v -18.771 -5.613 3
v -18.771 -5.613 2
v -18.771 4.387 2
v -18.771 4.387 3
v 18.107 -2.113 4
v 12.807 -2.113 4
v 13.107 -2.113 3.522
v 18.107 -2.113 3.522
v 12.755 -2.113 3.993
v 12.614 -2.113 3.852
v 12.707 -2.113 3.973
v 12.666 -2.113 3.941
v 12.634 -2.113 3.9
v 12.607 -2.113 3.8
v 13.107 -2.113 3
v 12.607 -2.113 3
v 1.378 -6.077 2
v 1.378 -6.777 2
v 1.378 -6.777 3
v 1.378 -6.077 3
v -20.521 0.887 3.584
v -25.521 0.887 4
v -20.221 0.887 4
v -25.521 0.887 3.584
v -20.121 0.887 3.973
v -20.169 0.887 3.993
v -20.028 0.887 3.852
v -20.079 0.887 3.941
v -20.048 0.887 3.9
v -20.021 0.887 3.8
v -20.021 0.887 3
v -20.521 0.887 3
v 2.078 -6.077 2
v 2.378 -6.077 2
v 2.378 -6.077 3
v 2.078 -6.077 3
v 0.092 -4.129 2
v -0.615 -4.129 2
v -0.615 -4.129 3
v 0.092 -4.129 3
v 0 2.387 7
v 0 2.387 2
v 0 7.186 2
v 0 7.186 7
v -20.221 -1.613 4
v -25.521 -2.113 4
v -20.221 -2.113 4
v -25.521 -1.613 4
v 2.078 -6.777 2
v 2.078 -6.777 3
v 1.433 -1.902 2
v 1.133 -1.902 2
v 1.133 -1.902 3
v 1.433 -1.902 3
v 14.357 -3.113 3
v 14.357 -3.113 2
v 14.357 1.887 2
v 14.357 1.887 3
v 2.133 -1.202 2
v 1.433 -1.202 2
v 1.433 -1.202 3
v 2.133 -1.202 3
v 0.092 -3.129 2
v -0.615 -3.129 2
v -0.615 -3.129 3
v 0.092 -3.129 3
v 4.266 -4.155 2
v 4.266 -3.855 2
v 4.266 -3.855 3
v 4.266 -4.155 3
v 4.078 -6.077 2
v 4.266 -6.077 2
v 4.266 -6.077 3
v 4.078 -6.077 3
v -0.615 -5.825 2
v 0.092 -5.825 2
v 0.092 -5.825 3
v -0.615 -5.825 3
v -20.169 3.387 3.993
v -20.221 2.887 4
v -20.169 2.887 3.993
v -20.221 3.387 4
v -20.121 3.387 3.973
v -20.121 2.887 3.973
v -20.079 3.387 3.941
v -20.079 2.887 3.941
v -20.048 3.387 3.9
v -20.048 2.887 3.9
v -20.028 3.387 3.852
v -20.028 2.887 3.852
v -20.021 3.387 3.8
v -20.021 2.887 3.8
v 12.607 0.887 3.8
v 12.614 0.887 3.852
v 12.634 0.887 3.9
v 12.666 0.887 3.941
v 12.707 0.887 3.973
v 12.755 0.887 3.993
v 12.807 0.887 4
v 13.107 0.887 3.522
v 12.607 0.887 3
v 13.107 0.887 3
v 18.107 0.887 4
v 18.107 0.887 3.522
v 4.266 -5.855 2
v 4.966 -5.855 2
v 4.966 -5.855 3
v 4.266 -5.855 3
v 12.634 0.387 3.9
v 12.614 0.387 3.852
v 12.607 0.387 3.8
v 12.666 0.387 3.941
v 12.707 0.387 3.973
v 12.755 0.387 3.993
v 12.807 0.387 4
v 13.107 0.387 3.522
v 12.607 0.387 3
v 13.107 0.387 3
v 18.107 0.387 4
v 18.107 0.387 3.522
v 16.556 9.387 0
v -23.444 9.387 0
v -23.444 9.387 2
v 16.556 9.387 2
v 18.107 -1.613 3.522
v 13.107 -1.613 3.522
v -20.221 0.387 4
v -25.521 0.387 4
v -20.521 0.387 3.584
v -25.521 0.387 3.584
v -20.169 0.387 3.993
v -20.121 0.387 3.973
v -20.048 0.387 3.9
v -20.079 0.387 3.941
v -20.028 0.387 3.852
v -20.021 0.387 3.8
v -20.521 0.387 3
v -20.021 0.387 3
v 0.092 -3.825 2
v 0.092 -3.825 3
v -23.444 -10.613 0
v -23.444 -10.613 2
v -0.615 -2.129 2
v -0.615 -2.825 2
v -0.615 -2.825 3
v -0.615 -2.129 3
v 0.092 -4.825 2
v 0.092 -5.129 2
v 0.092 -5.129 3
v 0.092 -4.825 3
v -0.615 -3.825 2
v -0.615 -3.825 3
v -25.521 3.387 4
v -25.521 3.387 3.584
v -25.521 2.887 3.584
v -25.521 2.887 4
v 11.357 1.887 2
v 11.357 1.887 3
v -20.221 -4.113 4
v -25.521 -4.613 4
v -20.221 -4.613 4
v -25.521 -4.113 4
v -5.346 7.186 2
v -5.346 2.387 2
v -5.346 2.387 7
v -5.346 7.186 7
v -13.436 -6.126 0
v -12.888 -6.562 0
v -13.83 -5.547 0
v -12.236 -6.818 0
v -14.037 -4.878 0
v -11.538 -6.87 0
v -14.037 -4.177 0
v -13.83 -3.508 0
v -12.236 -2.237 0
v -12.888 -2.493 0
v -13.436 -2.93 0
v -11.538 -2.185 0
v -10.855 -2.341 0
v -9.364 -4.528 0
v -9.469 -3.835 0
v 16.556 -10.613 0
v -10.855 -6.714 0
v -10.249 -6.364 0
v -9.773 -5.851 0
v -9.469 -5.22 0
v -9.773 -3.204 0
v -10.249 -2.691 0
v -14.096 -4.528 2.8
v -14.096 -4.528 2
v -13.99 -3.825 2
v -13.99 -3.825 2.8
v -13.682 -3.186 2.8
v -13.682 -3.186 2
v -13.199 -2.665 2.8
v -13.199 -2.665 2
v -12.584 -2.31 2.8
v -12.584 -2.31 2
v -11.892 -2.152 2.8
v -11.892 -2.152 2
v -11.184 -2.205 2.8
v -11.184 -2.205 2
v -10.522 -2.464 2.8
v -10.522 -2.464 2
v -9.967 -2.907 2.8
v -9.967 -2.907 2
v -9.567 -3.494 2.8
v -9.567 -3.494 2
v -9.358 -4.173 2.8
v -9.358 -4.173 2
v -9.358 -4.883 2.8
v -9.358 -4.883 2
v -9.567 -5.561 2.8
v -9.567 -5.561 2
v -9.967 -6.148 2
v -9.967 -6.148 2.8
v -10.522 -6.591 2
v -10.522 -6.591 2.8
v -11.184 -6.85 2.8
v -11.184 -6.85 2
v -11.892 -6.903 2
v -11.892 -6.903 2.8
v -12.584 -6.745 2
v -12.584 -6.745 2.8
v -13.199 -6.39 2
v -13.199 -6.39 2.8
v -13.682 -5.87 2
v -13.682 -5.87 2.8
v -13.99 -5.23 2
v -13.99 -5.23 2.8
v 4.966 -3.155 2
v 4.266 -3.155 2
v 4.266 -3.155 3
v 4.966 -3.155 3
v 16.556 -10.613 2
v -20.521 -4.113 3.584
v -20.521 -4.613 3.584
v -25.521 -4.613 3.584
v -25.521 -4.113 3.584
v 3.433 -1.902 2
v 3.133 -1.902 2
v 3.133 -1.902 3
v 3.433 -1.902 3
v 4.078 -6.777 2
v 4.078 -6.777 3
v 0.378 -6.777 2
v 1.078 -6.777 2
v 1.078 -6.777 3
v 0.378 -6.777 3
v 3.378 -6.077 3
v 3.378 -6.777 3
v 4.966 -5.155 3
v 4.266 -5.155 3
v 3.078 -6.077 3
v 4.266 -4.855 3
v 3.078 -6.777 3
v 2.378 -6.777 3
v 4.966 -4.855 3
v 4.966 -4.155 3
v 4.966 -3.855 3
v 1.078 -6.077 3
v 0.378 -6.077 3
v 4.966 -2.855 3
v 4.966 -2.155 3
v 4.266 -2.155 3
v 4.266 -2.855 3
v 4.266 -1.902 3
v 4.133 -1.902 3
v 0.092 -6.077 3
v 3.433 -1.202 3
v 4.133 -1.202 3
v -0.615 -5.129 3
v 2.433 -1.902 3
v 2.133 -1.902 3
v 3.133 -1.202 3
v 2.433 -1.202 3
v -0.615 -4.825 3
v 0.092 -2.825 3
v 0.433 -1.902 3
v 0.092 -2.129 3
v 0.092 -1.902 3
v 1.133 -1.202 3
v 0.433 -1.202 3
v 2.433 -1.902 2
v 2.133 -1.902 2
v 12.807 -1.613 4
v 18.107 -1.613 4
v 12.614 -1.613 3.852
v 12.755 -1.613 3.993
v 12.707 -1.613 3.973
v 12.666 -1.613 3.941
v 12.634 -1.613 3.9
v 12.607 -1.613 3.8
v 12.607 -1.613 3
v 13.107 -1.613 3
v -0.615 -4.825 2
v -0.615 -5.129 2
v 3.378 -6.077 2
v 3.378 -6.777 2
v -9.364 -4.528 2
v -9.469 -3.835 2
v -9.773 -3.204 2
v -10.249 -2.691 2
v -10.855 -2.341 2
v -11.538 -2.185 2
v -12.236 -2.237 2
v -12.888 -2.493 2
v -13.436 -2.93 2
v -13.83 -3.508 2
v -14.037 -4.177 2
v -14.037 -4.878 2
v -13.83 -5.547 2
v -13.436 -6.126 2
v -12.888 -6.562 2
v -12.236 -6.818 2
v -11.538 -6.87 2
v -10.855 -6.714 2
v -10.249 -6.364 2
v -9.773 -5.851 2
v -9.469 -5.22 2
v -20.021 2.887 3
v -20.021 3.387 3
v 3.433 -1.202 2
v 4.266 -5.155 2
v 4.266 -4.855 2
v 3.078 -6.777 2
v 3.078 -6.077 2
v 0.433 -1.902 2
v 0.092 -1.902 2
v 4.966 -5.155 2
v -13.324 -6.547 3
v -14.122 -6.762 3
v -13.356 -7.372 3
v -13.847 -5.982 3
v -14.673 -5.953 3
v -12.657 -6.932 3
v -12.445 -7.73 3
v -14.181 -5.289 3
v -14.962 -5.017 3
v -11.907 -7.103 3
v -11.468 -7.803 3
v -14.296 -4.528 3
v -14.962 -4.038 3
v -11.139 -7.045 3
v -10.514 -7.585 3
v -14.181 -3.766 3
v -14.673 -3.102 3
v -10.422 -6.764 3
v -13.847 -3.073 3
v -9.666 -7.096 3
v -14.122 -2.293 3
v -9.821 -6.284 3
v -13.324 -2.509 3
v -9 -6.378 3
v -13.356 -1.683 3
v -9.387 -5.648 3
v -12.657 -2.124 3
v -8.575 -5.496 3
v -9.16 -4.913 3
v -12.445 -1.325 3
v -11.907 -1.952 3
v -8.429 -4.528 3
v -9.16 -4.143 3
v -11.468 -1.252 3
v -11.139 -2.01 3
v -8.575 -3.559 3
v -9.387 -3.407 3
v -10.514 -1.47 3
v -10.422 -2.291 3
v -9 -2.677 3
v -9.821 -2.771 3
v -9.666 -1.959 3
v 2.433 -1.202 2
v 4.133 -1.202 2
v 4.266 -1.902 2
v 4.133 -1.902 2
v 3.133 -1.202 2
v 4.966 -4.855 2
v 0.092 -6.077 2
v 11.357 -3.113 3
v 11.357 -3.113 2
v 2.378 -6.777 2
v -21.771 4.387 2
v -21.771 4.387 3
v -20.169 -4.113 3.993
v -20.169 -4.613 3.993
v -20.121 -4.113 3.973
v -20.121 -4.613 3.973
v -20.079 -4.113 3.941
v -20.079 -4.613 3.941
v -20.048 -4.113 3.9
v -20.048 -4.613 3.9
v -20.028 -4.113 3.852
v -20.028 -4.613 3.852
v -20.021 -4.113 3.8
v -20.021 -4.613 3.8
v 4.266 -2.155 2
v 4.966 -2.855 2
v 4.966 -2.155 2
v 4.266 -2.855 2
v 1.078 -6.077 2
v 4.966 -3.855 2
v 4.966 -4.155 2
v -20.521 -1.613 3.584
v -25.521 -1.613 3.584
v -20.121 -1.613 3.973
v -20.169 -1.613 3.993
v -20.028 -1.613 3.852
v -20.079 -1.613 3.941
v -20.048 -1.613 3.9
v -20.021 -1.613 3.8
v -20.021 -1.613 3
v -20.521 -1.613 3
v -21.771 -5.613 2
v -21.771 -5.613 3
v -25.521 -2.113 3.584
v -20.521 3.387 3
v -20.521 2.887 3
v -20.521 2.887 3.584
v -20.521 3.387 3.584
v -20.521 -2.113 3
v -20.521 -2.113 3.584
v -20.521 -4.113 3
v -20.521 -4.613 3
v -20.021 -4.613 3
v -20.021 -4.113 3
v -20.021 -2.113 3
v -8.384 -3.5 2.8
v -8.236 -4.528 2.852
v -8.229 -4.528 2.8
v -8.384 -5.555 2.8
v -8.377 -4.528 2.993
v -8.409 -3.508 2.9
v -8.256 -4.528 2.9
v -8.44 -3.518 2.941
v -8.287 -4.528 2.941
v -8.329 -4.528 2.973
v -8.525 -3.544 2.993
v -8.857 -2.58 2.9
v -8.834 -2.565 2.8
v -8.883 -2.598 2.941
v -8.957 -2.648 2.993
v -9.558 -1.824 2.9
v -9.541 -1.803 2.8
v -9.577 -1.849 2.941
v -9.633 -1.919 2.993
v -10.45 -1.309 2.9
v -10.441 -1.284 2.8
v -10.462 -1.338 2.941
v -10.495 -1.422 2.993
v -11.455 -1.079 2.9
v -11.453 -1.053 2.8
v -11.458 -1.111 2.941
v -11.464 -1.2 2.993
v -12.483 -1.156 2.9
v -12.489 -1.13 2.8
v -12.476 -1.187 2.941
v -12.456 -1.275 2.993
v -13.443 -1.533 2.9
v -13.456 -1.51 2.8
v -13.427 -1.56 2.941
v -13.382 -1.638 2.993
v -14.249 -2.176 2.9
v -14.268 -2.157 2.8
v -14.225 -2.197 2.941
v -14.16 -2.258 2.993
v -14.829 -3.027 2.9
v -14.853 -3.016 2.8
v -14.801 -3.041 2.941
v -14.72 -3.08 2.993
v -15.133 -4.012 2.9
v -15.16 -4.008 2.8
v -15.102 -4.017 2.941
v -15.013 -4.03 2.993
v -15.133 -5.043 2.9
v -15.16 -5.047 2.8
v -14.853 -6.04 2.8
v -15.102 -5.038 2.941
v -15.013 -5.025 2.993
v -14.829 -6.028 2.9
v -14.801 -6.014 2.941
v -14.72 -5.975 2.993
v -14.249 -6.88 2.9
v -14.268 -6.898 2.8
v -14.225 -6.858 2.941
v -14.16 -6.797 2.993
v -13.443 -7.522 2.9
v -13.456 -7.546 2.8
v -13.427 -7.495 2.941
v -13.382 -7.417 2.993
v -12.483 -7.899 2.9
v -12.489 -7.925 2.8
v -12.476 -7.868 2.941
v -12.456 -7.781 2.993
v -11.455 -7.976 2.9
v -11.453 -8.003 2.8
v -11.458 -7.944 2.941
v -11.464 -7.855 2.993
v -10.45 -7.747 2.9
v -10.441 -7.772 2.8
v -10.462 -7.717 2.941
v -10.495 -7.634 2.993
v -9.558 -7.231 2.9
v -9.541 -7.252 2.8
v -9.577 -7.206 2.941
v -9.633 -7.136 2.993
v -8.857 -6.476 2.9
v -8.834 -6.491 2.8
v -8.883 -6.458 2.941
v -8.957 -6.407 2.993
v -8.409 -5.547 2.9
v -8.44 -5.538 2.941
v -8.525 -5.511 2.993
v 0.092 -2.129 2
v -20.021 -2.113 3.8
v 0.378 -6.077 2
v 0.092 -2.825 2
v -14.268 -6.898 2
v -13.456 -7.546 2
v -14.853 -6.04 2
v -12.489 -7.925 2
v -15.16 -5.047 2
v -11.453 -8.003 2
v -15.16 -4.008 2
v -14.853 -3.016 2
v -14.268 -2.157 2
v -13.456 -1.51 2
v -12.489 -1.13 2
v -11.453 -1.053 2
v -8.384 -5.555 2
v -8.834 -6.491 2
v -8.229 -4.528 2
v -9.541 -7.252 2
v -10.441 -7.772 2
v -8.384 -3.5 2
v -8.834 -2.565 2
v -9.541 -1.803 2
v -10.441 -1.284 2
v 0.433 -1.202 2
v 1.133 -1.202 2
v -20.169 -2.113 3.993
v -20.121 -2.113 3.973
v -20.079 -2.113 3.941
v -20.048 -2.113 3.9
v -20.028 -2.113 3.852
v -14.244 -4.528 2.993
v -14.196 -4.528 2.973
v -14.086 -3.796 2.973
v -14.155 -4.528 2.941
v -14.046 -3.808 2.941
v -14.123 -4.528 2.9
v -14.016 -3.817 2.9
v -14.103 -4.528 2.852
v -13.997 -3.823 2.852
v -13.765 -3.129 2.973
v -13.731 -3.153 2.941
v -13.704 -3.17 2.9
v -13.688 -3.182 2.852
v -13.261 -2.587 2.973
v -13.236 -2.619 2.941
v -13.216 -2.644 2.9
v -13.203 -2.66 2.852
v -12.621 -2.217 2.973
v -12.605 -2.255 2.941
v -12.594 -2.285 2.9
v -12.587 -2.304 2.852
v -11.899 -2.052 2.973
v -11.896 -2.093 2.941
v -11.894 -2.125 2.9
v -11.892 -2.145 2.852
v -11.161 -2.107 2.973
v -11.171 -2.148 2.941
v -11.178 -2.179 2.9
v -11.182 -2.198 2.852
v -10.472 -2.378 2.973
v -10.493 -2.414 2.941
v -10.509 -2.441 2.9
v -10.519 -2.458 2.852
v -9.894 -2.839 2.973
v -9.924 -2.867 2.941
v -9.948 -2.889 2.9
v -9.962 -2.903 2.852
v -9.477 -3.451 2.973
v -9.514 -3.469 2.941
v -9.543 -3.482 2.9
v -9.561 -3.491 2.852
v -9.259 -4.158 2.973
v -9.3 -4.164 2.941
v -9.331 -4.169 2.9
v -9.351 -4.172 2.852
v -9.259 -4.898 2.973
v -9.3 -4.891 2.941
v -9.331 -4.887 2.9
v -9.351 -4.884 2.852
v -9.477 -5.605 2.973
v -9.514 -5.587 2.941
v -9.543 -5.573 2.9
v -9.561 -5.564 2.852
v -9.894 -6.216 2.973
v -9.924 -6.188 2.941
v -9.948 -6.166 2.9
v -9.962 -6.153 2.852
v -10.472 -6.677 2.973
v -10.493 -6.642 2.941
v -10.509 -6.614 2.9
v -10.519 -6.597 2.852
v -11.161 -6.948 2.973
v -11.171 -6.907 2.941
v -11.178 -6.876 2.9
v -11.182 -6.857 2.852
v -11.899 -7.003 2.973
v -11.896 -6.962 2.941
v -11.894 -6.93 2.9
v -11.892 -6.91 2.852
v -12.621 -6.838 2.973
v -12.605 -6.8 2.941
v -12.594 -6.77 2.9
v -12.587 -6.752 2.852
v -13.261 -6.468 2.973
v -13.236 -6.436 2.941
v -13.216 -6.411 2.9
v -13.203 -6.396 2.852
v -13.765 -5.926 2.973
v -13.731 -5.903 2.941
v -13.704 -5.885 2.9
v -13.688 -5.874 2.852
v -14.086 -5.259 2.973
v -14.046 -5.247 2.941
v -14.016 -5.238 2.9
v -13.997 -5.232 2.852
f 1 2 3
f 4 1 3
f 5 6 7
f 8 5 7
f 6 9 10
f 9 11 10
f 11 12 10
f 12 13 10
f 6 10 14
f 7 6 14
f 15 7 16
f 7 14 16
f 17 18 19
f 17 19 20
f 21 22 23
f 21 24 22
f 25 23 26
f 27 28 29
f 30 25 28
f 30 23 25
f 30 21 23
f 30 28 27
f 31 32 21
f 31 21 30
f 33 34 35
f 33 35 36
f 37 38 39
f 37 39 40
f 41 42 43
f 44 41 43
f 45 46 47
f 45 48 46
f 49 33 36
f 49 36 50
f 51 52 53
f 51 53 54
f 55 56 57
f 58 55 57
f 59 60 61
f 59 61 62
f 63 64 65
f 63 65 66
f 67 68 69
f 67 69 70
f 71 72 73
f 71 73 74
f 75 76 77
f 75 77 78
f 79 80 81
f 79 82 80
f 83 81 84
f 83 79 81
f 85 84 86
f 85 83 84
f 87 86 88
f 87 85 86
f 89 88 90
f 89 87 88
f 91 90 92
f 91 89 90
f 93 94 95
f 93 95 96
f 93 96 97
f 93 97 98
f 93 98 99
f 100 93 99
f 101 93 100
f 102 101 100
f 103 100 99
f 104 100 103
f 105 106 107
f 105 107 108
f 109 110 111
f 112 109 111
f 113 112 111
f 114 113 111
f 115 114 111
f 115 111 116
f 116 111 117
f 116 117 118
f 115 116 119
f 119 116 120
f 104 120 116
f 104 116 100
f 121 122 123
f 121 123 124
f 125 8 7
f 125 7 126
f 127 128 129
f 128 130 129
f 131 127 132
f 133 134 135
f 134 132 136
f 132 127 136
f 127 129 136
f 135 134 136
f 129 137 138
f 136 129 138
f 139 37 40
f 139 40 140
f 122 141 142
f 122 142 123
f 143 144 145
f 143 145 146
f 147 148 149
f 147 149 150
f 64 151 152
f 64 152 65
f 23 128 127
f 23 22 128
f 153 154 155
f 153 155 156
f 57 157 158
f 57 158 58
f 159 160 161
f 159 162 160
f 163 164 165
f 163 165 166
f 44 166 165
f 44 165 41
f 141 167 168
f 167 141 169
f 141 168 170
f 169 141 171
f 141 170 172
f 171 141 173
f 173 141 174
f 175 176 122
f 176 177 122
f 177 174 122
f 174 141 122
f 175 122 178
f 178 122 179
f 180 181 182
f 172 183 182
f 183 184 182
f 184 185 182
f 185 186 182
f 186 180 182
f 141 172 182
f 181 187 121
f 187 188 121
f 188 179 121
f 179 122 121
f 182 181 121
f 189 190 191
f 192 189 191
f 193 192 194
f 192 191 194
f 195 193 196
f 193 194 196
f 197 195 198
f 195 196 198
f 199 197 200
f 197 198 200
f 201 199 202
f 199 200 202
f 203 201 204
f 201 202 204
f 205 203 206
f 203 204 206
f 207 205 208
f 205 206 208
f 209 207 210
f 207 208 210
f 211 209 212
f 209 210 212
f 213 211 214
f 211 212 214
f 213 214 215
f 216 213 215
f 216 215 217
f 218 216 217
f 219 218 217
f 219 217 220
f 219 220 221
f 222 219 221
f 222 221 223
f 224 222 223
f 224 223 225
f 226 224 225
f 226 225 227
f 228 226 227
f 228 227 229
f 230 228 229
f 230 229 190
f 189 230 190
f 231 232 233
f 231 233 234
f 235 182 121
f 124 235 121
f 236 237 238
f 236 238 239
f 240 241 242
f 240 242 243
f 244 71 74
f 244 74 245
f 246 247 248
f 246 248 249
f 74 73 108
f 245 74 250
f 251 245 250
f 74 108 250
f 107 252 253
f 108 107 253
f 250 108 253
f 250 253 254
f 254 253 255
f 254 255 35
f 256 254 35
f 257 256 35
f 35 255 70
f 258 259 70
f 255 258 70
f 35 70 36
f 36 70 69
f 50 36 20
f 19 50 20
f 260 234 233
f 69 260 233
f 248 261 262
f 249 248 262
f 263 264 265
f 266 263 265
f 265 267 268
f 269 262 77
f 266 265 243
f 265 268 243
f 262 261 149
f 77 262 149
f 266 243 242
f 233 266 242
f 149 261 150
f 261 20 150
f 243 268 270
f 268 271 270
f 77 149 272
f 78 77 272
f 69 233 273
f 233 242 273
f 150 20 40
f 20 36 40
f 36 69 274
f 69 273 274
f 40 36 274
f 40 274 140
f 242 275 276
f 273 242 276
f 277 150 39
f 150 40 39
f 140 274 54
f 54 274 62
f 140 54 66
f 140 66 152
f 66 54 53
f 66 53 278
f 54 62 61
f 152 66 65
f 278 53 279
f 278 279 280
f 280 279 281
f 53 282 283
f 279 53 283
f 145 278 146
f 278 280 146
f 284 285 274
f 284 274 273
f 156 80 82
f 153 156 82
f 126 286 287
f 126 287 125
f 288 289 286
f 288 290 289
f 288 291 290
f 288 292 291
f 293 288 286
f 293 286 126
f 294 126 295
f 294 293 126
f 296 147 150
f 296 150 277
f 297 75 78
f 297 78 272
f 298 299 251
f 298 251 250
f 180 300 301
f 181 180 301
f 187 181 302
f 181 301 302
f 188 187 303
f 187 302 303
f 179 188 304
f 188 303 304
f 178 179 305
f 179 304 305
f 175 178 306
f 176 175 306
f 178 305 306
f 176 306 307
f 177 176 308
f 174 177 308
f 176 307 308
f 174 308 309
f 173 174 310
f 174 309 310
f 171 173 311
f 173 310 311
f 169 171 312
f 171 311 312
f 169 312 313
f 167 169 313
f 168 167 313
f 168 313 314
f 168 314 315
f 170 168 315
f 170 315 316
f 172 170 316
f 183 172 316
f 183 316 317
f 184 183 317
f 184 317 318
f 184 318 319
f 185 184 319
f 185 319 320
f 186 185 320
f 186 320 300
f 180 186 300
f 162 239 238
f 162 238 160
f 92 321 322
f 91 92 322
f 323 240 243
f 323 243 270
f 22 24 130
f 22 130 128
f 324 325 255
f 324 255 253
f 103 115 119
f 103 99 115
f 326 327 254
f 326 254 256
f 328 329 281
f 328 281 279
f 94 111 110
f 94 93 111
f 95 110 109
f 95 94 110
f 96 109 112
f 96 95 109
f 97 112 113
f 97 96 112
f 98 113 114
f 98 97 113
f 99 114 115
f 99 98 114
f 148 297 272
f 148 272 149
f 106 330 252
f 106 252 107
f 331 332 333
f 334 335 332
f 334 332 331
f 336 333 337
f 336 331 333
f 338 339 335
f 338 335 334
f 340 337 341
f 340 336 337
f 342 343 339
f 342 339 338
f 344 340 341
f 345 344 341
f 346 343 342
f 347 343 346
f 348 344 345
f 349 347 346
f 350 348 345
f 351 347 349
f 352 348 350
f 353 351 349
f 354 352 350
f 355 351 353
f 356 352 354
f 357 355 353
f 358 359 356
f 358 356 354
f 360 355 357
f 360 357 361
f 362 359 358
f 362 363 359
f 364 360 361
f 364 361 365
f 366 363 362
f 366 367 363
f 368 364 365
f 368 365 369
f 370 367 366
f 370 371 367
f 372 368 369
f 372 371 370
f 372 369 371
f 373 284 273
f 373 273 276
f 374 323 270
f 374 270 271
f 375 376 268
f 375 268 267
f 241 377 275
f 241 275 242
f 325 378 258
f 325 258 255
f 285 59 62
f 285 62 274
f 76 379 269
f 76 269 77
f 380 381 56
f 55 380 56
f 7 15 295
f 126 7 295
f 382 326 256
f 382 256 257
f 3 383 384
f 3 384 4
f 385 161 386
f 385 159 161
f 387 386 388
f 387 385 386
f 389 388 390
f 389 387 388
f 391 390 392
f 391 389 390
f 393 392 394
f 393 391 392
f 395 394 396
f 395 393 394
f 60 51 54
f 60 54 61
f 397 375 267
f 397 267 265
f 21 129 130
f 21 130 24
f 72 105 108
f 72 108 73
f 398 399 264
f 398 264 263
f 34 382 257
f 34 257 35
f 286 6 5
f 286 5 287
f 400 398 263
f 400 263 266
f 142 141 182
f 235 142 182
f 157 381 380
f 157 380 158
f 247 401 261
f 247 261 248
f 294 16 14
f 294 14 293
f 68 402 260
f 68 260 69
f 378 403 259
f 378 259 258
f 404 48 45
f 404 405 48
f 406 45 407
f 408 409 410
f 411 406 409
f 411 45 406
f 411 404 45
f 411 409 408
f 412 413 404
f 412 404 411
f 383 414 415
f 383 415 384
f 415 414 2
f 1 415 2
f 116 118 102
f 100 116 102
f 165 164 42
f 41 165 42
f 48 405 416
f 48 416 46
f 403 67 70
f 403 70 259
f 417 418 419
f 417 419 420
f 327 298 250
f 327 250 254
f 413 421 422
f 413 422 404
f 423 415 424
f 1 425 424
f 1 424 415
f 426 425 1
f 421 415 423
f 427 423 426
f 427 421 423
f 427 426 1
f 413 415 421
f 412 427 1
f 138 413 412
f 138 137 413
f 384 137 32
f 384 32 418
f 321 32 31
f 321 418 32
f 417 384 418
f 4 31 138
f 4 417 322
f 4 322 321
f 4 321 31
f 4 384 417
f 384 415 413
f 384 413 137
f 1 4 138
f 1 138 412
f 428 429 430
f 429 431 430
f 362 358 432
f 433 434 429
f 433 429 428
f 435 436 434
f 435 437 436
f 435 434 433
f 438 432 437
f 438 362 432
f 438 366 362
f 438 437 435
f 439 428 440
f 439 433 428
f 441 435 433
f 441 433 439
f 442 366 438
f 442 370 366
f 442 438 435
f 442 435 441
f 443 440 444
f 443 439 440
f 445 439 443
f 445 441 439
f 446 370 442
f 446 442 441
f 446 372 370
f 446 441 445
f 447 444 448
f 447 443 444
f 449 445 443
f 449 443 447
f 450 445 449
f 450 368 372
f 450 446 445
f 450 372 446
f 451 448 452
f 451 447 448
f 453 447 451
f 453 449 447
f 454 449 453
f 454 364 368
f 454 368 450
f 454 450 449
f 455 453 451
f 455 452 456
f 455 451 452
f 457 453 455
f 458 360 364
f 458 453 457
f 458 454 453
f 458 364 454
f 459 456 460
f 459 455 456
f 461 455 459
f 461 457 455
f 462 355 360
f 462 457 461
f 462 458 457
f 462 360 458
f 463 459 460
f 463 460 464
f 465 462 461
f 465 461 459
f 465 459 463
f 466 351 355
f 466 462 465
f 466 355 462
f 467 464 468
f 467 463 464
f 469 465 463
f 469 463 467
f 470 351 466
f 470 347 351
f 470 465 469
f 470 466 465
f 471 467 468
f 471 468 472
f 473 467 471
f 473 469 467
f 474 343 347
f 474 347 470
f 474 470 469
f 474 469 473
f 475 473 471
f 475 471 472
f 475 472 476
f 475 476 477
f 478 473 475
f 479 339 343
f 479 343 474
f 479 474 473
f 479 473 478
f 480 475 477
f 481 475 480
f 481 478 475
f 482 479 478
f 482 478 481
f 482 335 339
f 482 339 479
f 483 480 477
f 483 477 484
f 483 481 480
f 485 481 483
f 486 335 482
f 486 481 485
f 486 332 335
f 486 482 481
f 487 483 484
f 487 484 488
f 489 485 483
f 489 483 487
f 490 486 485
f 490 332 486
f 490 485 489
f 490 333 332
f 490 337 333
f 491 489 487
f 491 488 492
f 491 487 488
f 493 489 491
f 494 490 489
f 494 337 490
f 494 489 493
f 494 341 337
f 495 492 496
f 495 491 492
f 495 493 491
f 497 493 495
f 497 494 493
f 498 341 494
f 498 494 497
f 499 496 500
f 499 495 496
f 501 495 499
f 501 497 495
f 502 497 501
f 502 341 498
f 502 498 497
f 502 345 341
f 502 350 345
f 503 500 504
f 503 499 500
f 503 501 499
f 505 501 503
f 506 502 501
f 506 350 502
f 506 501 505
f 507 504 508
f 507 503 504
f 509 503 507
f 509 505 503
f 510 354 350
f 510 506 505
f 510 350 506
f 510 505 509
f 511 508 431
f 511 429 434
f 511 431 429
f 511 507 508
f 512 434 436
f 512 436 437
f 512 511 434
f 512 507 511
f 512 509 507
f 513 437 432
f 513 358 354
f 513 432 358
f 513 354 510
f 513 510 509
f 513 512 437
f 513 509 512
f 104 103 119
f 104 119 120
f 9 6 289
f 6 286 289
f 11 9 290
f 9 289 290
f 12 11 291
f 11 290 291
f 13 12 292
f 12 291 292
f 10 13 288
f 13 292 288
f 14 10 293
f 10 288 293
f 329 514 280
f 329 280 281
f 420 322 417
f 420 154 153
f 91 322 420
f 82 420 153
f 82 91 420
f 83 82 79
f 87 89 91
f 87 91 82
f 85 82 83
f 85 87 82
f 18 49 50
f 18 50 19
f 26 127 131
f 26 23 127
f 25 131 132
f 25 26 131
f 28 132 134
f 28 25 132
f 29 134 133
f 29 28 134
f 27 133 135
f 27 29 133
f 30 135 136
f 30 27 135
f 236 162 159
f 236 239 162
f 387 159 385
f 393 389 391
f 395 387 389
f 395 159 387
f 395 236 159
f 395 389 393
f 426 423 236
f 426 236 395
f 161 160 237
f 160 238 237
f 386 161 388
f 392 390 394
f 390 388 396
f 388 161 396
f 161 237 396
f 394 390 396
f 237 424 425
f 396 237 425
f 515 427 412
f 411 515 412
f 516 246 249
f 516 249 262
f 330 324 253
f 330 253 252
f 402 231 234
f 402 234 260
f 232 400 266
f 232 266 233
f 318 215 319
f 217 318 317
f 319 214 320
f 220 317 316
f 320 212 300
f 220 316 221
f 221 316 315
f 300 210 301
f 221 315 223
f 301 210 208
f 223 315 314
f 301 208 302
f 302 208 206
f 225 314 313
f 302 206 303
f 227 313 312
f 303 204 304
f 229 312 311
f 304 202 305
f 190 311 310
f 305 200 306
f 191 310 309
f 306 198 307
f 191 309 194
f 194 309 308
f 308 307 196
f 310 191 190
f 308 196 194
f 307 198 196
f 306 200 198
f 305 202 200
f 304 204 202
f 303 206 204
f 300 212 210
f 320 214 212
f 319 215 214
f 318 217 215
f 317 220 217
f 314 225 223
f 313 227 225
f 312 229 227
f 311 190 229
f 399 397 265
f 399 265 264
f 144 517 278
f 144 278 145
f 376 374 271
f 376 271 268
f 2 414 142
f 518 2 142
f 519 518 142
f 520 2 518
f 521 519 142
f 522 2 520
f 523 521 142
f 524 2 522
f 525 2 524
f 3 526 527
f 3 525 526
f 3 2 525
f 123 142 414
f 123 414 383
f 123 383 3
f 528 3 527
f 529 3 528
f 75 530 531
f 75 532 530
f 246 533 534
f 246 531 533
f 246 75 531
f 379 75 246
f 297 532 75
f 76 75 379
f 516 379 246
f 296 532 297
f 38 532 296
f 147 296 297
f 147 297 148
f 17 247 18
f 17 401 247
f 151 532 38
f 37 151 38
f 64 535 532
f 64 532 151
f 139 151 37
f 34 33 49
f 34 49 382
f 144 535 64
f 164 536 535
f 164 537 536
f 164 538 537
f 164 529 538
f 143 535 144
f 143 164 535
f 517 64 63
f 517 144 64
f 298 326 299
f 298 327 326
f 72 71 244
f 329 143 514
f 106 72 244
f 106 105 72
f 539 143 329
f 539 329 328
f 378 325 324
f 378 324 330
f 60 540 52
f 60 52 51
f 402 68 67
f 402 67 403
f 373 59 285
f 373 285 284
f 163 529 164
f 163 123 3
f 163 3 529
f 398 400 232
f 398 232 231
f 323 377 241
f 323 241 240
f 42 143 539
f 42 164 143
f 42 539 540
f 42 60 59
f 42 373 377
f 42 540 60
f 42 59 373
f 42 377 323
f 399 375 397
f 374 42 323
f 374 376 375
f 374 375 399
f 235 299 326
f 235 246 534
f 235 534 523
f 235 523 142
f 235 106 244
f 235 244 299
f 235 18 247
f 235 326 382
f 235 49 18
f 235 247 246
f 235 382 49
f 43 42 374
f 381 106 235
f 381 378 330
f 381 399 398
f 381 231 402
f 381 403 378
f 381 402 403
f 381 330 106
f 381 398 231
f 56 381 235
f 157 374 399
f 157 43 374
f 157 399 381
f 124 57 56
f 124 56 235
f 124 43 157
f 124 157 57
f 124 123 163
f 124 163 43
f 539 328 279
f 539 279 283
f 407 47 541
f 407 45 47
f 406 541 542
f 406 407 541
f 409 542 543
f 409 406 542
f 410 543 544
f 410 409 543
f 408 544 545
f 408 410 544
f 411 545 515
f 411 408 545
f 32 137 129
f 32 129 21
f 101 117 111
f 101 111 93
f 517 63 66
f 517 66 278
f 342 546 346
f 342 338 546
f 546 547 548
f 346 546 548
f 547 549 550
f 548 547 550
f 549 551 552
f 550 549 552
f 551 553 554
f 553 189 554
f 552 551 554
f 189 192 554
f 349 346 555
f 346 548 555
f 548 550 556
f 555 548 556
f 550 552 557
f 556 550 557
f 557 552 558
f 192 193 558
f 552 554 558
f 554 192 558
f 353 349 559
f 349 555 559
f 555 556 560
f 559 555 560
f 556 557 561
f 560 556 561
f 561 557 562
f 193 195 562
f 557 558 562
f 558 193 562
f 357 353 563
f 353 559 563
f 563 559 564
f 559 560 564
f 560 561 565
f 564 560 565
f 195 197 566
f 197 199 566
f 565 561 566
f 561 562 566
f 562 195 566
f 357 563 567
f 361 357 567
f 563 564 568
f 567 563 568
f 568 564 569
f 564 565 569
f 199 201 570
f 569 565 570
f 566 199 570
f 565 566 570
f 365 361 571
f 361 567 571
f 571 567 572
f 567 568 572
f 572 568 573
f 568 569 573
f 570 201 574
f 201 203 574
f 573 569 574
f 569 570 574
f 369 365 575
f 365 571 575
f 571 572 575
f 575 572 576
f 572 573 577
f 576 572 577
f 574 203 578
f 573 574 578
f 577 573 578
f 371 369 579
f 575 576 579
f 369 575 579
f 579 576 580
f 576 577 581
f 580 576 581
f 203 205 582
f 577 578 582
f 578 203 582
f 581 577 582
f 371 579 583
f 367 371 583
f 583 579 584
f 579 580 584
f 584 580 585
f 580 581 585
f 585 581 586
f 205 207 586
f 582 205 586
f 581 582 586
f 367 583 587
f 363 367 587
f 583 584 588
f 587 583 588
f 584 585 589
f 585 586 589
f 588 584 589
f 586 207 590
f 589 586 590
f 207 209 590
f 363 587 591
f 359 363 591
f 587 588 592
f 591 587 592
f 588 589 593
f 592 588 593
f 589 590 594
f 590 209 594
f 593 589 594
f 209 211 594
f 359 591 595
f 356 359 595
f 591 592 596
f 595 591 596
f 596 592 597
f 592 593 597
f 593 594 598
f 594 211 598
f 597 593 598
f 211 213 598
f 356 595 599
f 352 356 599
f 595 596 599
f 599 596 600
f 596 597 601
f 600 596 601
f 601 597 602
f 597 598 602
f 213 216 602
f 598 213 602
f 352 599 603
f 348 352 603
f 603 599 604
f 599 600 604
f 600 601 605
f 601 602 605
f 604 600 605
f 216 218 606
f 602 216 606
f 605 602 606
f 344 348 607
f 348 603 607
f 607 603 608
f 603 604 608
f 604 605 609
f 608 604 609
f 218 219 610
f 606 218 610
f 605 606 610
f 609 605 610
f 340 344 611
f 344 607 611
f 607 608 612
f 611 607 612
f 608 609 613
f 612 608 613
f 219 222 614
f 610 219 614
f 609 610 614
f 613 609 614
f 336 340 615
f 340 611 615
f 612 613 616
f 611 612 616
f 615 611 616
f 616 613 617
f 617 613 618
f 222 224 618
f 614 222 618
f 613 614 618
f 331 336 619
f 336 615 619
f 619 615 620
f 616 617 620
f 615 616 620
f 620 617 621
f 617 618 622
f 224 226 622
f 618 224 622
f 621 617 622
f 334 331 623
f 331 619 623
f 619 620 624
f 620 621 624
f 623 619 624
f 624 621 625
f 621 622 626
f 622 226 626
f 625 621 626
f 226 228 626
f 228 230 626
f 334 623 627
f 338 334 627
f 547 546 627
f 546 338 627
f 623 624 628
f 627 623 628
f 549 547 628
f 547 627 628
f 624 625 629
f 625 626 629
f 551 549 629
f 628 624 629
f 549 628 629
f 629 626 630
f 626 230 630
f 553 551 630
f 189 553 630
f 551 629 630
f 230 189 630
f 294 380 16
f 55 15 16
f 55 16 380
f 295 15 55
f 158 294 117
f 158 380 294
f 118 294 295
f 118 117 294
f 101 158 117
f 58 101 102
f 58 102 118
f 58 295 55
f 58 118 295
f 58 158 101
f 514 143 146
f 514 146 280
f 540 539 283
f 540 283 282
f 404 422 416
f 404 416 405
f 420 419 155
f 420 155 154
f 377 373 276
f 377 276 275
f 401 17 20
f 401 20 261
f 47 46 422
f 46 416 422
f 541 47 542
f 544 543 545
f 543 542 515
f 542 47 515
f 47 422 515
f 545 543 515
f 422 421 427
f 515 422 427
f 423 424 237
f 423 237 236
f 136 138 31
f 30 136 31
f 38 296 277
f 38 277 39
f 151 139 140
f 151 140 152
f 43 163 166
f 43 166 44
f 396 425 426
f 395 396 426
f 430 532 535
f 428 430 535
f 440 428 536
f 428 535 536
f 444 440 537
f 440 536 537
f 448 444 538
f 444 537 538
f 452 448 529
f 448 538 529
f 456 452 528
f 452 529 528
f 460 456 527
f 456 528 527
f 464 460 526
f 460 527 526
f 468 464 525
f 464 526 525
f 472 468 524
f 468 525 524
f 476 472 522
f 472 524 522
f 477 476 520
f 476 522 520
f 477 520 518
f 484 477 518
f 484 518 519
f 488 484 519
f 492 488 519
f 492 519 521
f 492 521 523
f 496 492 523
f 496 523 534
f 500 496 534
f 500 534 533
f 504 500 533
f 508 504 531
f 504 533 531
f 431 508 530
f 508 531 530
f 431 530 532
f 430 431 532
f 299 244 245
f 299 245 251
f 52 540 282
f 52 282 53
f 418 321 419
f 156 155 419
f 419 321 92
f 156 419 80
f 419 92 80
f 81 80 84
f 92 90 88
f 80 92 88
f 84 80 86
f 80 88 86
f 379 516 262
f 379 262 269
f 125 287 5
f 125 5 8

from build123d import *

# Parameters (mm, degrees)
SKETCH1_W           = 40
SKETCH1_H           = 20
BOSS_EXTRUDE1_DEPTH = 2
SKETCH2_W           = 3
SKETCH2_H           = 10
SKETCH2_H_2         = 5
BOSS_EXTRUDE2_DEPTH = 1
SKETCH3_W           = 0.5
SKETCH3_H           = 0.5
BOSS_EXTRUDE3_DEPTH = 1
SKETCH5_W           = 0.415981526
SKETCH5_H           = 0.5
BOSS_EXTRUDE4_DEPTH = 5
FILLET1_R           = 0.2
SKETCH7_W           = 0.477868842
SKETCH7_H           = 0.5
BOSS_EXTRUDE5_DEPTH = 5
FILLET3_R           = 0.2
SKETCH8_W           = 5.346247603
SKETCH8_H           = 4.799297503
BOSS_EXTRUDE6_DEPTH = 5
BOSS_EXTRUDE8_DEPTH = 1
CUT_EXTRUDE1_REACH  = 30.088
SKETCH10_R          = 2.349261849
SKETCH13_R          = 3.48485592
BOSS_EXTRUDE9_DEPTH = 1
CUT_EXTRUDE2_REACH  = 30.088
SKETCH14_R          = 2.382418239
FILLET5_R           = 0.2


with BuildPart() as part:
    # Sketch1 → Boss-Extrude1 (new body)
    with BuildSketch(Plane.XY):
        with Locations((-3.443579767, -0.612840467)):
            Rectangle(SKETCH1_W, SKETCH1_H)
    extrude(amount=BOSS_EXTRUDE1_DEPTH)

    # Sketch2 → Boss-Extrude2 (add)
    with BuildSketch(Plane.XY.offset(2)):
        with Locations((-20.270719319, -0.612840467)):
            Rectangle(SKETCH2_W, SKETCH2_H)
        with Locations((12.857244344, -0.612840467)):
            Rectangle(SKETCH2_W, SKETCH2_H_2)
    extrude(amount=BOSS_EXTRUDE2_DEPTH)

    # Sketch3 → Boss-Extrude3 (add)
    with BuildSketch(Plane.XY.offset(3)):
        with Locations((-20.270719319, 3.137159533)):
            Rectangle(SKETCH3_W, SKETCH3_H)
        with Locations((-20.270719319, 0.637159533)):
            Rectangle(SKETCH3_W, SKETCH3_H)
        with Locations((-20.270719319, -1.862840467)):
            Rectangle(SKETCH3_W, SKETCH3_H)
        with Locations((-20.270719319, -4.362840467)):
            Rectangle(SKETCH3_W, SKETCH3_H)
        with Locations((12.857244344, -1.862840467)):
            Rectangle(SKETCH3_W, SKETCH3_H)
        with Locations((12.857244344, 0.637159533)):
            Rectangle(SKETCH3_W, SKETCH3_H)
    extrude(amount=BOSS_EXTRUDE3_DEPTH)

    # Sketch5 → Boss-Extrude4 (add)
    with BuildSketch(Plane.ZY.offset(20.520719319)):
        with Locations((3.792009237, 3.137159533)):
            Rectangle(SKETCH5_W, SKETCH5_H)
        with Locations((3.792009237, 0.637159533)):
            Rectangle(SKETCH5_W, SKETCH5_H)
        with Locations((3.792009237, -1.862840467)):
            Rectangle(SKETCH5_W, SKETCH5_H)
        with Locations((3.792009237, -4.362840467)):
            Rectangle(SKETCH5_W, SKETCH5_H)
    extrude(amount=BOSS_EXTRUDE4_DEPTH)

    # Fillet1
    fillet1_edges = [part.edges().sort_by_distance(p)[0] for p in [
        (-20.020719319, 3.137159533, 4),
        (-20.020719319, 0.637159533, 4),
        (-20.020719319, -1.862840467, 4),
        (-20.020719319, -4.362840467, 4),
    ]]
    fillet(fillet1_edges, radius=FILLET1_R)

    # Sketch7 → Boss-Extrude5 (add)
    with BuildSketch(Plane(origin=(13.107244344, 0, 0), x_dir=(0, 0, -1), z_dir=(1, 0, 0))):
        with Locations((-3.761065579, -1.862840467)):
            Rectangle(SKETCH7_W, SKETCH7_H)
        with Locations((-3.761065579, 0.637159533)):
            Rectangle(SKETCH7_W, SKETCH7_H)
    extrude(amount=BOSS_EXTRUDE5_DEPTH)

    # Fillet3
    fillet3_edges = [part.edges().sort_by_distance(p)[0] for p in [
        (12.607244344, -1.862840467, 4),
        (12.607244344, 0.637159533, 4),
    ]]
    fillet(fillet3_edges, radius=FILLET3_R)

    # Sketch8 → Boss-Extrude6 (add)
    with BuildSketch(Plane.XY.offset(2)):
        with Locations((-2.673123802, 4.786787988)):
            Rectangle(SKETCH8_W, SKETCH8_H)
    extrude(amount=BOSS_EXTRUDE6_DEPTH)

    # Sketch9 → Boss-Extrude8 (add)
    with BuildSketch(Plane.XY.offset(2)):
        Polygon((0.091656416, -4.824510849), (-0.615226542, -4.824510849), (-0.615226542, -4.128822948), (0.091656416, -4.128822948), (0.091656416, -3.824510849), (-0.615226542, -3.824510849), (-0.615226542, -3.128822948), (0.091656416, -3.128822948), (0.091656416, -2.824510849), (-0.615226542, -2.824510849), (-0.615226542, -2.128822948), (0.091656416, -2.128822948), (0.091656416, -1.902319725), (0.43302666, -1.902319725), (0.43302666, -1.202319725), (1.13302666, -1.202319725), (1.13302666, -1.902319725), (1.43302666, -1.902319725), (1.43302666, -1.202319725), (2.13302666, -1.202319725), (2.13302666, -1.902319725), (2.43302666, -1.902319725), (2.43302666, -1.202319725), (3.13302666, -1.202319725), (3.13302666, -1.902319725), (3.43302666, -1.902319725), (3.43302666, -1.202319725), (4.13302666, -1.202319725), (4.13302666, -1.902319725), (4.266316816, -1.902319725), (4.266316816, -2.154701216), (4.966316816, -2.154701216), (4.966316816, -2.854701216), (4.266316816, -2.854701216), (4.266316816, -3.154701216), (4.966316816, -3.154701216), (4.966316816, -3.854701216), (4.266316816, -3.854701216), (4.266316816, -4.154701216), (4.966316816, -4.154701216), (4.966316816, -4.854701216), (4.266316816, -4.854701216), (4.266316816, -5.154701216), (4.966316816, -5.154701216), (4.966316816, -5.854701216), (4.266316816, -5.854701216), (4.266316816, -6.07698014), (4.077584514, -6.07698014), (4.077584514, -6.77698014), (3.377584514, -6.77698014), (3.377584514, -6.07698014), (3.077584514, -6.07698014), (3.077584514, -6.77698014), (2.377584514, -6.77698014), (2.377584514, -6.07698014), (2.077584514, -6.07698014), (2.077584514, -6.77698014), (1.377584514, -6.77698014), (1.377584514, -6.07698014), (1.077584514, -6.07698014), (1.077584514, -6.77698014), (0.377584514, -6.77698014), (0.377584514, -6.07698014), (0.091656416, -6.07698014), (0.091656416, -5.824510849), (-0.615226542, -5.824510849), (-0.615226542, -5.128822948), (0.091656416, -5.128822948), align=None)
    extrude(amount=BOSS_EXTRUDE8_DEPTH)

    # Sketch10 → Cut-Extrude1 (cut, up to next)
    with BuildSketch(Plane.XY.offset(2), mode=Mode.PRIVATE) as cut_extrude1_sk1:
        with Locations((-11.713689096, -4.527627409)):
            Circle(SKETCH10_R)
    cut_extrude1_tool1 = extrude(cut_extrude1_sk1.sketch, amount=-CUT_EXTRUDE1_REACH, mode=Mode.PRIVATE) & part.part
    add(cut_extrude1_tool1.solids().sort_by_distance((-11.713689, -4.527627, 2))[0], mode=Mode.SUBTRACT)

    # Sketch13 → Boss-Extrude9 (add)
    with BuildSketch(Plane.XY.offset(2)):
        with Locations((-11.713689096, -4.527627409)):
            Circle(SKETCH13_R)
    extrude(amount=BOSS_EXTRUDE9_DEPTH)

    # Sketch14 → Cut-Extrude2 (cut, up to next)
    with BuildSketch(Plane(origin=(0, 0, 2), x_dir=(-1, 0, 0), z_dir=(0, 0, -1)), mode=Mode.PRIVATE) as cut_extrude2_sk1:
        with Locations((11.713689096, -4.527627409)):
            Circle(SKETCH14_R)
    cut_extrude2_tool1 = extrude(cut_extrude2_sk1.sketch, amount=-CUT_EXTRUDE2_REACH, mode=Mode.PRIVATE) & part.part
    add(cut_extrude2_tool1.solids().sort_by_distance((-11.713689, -4.527627, 2))[0], mode=Mode.SUBTRACT)

    # Fillet5
    fillet5_edges = [part.edges().sort_by_distance(p)[0] for p in [
        (-15.198545015, -4.527627409, 3),
        (-9.331270856, -4.527627409, 3),
    ]]
    fillet(fillet5_edges, radius=FILLET5_R)


solid = part.part
